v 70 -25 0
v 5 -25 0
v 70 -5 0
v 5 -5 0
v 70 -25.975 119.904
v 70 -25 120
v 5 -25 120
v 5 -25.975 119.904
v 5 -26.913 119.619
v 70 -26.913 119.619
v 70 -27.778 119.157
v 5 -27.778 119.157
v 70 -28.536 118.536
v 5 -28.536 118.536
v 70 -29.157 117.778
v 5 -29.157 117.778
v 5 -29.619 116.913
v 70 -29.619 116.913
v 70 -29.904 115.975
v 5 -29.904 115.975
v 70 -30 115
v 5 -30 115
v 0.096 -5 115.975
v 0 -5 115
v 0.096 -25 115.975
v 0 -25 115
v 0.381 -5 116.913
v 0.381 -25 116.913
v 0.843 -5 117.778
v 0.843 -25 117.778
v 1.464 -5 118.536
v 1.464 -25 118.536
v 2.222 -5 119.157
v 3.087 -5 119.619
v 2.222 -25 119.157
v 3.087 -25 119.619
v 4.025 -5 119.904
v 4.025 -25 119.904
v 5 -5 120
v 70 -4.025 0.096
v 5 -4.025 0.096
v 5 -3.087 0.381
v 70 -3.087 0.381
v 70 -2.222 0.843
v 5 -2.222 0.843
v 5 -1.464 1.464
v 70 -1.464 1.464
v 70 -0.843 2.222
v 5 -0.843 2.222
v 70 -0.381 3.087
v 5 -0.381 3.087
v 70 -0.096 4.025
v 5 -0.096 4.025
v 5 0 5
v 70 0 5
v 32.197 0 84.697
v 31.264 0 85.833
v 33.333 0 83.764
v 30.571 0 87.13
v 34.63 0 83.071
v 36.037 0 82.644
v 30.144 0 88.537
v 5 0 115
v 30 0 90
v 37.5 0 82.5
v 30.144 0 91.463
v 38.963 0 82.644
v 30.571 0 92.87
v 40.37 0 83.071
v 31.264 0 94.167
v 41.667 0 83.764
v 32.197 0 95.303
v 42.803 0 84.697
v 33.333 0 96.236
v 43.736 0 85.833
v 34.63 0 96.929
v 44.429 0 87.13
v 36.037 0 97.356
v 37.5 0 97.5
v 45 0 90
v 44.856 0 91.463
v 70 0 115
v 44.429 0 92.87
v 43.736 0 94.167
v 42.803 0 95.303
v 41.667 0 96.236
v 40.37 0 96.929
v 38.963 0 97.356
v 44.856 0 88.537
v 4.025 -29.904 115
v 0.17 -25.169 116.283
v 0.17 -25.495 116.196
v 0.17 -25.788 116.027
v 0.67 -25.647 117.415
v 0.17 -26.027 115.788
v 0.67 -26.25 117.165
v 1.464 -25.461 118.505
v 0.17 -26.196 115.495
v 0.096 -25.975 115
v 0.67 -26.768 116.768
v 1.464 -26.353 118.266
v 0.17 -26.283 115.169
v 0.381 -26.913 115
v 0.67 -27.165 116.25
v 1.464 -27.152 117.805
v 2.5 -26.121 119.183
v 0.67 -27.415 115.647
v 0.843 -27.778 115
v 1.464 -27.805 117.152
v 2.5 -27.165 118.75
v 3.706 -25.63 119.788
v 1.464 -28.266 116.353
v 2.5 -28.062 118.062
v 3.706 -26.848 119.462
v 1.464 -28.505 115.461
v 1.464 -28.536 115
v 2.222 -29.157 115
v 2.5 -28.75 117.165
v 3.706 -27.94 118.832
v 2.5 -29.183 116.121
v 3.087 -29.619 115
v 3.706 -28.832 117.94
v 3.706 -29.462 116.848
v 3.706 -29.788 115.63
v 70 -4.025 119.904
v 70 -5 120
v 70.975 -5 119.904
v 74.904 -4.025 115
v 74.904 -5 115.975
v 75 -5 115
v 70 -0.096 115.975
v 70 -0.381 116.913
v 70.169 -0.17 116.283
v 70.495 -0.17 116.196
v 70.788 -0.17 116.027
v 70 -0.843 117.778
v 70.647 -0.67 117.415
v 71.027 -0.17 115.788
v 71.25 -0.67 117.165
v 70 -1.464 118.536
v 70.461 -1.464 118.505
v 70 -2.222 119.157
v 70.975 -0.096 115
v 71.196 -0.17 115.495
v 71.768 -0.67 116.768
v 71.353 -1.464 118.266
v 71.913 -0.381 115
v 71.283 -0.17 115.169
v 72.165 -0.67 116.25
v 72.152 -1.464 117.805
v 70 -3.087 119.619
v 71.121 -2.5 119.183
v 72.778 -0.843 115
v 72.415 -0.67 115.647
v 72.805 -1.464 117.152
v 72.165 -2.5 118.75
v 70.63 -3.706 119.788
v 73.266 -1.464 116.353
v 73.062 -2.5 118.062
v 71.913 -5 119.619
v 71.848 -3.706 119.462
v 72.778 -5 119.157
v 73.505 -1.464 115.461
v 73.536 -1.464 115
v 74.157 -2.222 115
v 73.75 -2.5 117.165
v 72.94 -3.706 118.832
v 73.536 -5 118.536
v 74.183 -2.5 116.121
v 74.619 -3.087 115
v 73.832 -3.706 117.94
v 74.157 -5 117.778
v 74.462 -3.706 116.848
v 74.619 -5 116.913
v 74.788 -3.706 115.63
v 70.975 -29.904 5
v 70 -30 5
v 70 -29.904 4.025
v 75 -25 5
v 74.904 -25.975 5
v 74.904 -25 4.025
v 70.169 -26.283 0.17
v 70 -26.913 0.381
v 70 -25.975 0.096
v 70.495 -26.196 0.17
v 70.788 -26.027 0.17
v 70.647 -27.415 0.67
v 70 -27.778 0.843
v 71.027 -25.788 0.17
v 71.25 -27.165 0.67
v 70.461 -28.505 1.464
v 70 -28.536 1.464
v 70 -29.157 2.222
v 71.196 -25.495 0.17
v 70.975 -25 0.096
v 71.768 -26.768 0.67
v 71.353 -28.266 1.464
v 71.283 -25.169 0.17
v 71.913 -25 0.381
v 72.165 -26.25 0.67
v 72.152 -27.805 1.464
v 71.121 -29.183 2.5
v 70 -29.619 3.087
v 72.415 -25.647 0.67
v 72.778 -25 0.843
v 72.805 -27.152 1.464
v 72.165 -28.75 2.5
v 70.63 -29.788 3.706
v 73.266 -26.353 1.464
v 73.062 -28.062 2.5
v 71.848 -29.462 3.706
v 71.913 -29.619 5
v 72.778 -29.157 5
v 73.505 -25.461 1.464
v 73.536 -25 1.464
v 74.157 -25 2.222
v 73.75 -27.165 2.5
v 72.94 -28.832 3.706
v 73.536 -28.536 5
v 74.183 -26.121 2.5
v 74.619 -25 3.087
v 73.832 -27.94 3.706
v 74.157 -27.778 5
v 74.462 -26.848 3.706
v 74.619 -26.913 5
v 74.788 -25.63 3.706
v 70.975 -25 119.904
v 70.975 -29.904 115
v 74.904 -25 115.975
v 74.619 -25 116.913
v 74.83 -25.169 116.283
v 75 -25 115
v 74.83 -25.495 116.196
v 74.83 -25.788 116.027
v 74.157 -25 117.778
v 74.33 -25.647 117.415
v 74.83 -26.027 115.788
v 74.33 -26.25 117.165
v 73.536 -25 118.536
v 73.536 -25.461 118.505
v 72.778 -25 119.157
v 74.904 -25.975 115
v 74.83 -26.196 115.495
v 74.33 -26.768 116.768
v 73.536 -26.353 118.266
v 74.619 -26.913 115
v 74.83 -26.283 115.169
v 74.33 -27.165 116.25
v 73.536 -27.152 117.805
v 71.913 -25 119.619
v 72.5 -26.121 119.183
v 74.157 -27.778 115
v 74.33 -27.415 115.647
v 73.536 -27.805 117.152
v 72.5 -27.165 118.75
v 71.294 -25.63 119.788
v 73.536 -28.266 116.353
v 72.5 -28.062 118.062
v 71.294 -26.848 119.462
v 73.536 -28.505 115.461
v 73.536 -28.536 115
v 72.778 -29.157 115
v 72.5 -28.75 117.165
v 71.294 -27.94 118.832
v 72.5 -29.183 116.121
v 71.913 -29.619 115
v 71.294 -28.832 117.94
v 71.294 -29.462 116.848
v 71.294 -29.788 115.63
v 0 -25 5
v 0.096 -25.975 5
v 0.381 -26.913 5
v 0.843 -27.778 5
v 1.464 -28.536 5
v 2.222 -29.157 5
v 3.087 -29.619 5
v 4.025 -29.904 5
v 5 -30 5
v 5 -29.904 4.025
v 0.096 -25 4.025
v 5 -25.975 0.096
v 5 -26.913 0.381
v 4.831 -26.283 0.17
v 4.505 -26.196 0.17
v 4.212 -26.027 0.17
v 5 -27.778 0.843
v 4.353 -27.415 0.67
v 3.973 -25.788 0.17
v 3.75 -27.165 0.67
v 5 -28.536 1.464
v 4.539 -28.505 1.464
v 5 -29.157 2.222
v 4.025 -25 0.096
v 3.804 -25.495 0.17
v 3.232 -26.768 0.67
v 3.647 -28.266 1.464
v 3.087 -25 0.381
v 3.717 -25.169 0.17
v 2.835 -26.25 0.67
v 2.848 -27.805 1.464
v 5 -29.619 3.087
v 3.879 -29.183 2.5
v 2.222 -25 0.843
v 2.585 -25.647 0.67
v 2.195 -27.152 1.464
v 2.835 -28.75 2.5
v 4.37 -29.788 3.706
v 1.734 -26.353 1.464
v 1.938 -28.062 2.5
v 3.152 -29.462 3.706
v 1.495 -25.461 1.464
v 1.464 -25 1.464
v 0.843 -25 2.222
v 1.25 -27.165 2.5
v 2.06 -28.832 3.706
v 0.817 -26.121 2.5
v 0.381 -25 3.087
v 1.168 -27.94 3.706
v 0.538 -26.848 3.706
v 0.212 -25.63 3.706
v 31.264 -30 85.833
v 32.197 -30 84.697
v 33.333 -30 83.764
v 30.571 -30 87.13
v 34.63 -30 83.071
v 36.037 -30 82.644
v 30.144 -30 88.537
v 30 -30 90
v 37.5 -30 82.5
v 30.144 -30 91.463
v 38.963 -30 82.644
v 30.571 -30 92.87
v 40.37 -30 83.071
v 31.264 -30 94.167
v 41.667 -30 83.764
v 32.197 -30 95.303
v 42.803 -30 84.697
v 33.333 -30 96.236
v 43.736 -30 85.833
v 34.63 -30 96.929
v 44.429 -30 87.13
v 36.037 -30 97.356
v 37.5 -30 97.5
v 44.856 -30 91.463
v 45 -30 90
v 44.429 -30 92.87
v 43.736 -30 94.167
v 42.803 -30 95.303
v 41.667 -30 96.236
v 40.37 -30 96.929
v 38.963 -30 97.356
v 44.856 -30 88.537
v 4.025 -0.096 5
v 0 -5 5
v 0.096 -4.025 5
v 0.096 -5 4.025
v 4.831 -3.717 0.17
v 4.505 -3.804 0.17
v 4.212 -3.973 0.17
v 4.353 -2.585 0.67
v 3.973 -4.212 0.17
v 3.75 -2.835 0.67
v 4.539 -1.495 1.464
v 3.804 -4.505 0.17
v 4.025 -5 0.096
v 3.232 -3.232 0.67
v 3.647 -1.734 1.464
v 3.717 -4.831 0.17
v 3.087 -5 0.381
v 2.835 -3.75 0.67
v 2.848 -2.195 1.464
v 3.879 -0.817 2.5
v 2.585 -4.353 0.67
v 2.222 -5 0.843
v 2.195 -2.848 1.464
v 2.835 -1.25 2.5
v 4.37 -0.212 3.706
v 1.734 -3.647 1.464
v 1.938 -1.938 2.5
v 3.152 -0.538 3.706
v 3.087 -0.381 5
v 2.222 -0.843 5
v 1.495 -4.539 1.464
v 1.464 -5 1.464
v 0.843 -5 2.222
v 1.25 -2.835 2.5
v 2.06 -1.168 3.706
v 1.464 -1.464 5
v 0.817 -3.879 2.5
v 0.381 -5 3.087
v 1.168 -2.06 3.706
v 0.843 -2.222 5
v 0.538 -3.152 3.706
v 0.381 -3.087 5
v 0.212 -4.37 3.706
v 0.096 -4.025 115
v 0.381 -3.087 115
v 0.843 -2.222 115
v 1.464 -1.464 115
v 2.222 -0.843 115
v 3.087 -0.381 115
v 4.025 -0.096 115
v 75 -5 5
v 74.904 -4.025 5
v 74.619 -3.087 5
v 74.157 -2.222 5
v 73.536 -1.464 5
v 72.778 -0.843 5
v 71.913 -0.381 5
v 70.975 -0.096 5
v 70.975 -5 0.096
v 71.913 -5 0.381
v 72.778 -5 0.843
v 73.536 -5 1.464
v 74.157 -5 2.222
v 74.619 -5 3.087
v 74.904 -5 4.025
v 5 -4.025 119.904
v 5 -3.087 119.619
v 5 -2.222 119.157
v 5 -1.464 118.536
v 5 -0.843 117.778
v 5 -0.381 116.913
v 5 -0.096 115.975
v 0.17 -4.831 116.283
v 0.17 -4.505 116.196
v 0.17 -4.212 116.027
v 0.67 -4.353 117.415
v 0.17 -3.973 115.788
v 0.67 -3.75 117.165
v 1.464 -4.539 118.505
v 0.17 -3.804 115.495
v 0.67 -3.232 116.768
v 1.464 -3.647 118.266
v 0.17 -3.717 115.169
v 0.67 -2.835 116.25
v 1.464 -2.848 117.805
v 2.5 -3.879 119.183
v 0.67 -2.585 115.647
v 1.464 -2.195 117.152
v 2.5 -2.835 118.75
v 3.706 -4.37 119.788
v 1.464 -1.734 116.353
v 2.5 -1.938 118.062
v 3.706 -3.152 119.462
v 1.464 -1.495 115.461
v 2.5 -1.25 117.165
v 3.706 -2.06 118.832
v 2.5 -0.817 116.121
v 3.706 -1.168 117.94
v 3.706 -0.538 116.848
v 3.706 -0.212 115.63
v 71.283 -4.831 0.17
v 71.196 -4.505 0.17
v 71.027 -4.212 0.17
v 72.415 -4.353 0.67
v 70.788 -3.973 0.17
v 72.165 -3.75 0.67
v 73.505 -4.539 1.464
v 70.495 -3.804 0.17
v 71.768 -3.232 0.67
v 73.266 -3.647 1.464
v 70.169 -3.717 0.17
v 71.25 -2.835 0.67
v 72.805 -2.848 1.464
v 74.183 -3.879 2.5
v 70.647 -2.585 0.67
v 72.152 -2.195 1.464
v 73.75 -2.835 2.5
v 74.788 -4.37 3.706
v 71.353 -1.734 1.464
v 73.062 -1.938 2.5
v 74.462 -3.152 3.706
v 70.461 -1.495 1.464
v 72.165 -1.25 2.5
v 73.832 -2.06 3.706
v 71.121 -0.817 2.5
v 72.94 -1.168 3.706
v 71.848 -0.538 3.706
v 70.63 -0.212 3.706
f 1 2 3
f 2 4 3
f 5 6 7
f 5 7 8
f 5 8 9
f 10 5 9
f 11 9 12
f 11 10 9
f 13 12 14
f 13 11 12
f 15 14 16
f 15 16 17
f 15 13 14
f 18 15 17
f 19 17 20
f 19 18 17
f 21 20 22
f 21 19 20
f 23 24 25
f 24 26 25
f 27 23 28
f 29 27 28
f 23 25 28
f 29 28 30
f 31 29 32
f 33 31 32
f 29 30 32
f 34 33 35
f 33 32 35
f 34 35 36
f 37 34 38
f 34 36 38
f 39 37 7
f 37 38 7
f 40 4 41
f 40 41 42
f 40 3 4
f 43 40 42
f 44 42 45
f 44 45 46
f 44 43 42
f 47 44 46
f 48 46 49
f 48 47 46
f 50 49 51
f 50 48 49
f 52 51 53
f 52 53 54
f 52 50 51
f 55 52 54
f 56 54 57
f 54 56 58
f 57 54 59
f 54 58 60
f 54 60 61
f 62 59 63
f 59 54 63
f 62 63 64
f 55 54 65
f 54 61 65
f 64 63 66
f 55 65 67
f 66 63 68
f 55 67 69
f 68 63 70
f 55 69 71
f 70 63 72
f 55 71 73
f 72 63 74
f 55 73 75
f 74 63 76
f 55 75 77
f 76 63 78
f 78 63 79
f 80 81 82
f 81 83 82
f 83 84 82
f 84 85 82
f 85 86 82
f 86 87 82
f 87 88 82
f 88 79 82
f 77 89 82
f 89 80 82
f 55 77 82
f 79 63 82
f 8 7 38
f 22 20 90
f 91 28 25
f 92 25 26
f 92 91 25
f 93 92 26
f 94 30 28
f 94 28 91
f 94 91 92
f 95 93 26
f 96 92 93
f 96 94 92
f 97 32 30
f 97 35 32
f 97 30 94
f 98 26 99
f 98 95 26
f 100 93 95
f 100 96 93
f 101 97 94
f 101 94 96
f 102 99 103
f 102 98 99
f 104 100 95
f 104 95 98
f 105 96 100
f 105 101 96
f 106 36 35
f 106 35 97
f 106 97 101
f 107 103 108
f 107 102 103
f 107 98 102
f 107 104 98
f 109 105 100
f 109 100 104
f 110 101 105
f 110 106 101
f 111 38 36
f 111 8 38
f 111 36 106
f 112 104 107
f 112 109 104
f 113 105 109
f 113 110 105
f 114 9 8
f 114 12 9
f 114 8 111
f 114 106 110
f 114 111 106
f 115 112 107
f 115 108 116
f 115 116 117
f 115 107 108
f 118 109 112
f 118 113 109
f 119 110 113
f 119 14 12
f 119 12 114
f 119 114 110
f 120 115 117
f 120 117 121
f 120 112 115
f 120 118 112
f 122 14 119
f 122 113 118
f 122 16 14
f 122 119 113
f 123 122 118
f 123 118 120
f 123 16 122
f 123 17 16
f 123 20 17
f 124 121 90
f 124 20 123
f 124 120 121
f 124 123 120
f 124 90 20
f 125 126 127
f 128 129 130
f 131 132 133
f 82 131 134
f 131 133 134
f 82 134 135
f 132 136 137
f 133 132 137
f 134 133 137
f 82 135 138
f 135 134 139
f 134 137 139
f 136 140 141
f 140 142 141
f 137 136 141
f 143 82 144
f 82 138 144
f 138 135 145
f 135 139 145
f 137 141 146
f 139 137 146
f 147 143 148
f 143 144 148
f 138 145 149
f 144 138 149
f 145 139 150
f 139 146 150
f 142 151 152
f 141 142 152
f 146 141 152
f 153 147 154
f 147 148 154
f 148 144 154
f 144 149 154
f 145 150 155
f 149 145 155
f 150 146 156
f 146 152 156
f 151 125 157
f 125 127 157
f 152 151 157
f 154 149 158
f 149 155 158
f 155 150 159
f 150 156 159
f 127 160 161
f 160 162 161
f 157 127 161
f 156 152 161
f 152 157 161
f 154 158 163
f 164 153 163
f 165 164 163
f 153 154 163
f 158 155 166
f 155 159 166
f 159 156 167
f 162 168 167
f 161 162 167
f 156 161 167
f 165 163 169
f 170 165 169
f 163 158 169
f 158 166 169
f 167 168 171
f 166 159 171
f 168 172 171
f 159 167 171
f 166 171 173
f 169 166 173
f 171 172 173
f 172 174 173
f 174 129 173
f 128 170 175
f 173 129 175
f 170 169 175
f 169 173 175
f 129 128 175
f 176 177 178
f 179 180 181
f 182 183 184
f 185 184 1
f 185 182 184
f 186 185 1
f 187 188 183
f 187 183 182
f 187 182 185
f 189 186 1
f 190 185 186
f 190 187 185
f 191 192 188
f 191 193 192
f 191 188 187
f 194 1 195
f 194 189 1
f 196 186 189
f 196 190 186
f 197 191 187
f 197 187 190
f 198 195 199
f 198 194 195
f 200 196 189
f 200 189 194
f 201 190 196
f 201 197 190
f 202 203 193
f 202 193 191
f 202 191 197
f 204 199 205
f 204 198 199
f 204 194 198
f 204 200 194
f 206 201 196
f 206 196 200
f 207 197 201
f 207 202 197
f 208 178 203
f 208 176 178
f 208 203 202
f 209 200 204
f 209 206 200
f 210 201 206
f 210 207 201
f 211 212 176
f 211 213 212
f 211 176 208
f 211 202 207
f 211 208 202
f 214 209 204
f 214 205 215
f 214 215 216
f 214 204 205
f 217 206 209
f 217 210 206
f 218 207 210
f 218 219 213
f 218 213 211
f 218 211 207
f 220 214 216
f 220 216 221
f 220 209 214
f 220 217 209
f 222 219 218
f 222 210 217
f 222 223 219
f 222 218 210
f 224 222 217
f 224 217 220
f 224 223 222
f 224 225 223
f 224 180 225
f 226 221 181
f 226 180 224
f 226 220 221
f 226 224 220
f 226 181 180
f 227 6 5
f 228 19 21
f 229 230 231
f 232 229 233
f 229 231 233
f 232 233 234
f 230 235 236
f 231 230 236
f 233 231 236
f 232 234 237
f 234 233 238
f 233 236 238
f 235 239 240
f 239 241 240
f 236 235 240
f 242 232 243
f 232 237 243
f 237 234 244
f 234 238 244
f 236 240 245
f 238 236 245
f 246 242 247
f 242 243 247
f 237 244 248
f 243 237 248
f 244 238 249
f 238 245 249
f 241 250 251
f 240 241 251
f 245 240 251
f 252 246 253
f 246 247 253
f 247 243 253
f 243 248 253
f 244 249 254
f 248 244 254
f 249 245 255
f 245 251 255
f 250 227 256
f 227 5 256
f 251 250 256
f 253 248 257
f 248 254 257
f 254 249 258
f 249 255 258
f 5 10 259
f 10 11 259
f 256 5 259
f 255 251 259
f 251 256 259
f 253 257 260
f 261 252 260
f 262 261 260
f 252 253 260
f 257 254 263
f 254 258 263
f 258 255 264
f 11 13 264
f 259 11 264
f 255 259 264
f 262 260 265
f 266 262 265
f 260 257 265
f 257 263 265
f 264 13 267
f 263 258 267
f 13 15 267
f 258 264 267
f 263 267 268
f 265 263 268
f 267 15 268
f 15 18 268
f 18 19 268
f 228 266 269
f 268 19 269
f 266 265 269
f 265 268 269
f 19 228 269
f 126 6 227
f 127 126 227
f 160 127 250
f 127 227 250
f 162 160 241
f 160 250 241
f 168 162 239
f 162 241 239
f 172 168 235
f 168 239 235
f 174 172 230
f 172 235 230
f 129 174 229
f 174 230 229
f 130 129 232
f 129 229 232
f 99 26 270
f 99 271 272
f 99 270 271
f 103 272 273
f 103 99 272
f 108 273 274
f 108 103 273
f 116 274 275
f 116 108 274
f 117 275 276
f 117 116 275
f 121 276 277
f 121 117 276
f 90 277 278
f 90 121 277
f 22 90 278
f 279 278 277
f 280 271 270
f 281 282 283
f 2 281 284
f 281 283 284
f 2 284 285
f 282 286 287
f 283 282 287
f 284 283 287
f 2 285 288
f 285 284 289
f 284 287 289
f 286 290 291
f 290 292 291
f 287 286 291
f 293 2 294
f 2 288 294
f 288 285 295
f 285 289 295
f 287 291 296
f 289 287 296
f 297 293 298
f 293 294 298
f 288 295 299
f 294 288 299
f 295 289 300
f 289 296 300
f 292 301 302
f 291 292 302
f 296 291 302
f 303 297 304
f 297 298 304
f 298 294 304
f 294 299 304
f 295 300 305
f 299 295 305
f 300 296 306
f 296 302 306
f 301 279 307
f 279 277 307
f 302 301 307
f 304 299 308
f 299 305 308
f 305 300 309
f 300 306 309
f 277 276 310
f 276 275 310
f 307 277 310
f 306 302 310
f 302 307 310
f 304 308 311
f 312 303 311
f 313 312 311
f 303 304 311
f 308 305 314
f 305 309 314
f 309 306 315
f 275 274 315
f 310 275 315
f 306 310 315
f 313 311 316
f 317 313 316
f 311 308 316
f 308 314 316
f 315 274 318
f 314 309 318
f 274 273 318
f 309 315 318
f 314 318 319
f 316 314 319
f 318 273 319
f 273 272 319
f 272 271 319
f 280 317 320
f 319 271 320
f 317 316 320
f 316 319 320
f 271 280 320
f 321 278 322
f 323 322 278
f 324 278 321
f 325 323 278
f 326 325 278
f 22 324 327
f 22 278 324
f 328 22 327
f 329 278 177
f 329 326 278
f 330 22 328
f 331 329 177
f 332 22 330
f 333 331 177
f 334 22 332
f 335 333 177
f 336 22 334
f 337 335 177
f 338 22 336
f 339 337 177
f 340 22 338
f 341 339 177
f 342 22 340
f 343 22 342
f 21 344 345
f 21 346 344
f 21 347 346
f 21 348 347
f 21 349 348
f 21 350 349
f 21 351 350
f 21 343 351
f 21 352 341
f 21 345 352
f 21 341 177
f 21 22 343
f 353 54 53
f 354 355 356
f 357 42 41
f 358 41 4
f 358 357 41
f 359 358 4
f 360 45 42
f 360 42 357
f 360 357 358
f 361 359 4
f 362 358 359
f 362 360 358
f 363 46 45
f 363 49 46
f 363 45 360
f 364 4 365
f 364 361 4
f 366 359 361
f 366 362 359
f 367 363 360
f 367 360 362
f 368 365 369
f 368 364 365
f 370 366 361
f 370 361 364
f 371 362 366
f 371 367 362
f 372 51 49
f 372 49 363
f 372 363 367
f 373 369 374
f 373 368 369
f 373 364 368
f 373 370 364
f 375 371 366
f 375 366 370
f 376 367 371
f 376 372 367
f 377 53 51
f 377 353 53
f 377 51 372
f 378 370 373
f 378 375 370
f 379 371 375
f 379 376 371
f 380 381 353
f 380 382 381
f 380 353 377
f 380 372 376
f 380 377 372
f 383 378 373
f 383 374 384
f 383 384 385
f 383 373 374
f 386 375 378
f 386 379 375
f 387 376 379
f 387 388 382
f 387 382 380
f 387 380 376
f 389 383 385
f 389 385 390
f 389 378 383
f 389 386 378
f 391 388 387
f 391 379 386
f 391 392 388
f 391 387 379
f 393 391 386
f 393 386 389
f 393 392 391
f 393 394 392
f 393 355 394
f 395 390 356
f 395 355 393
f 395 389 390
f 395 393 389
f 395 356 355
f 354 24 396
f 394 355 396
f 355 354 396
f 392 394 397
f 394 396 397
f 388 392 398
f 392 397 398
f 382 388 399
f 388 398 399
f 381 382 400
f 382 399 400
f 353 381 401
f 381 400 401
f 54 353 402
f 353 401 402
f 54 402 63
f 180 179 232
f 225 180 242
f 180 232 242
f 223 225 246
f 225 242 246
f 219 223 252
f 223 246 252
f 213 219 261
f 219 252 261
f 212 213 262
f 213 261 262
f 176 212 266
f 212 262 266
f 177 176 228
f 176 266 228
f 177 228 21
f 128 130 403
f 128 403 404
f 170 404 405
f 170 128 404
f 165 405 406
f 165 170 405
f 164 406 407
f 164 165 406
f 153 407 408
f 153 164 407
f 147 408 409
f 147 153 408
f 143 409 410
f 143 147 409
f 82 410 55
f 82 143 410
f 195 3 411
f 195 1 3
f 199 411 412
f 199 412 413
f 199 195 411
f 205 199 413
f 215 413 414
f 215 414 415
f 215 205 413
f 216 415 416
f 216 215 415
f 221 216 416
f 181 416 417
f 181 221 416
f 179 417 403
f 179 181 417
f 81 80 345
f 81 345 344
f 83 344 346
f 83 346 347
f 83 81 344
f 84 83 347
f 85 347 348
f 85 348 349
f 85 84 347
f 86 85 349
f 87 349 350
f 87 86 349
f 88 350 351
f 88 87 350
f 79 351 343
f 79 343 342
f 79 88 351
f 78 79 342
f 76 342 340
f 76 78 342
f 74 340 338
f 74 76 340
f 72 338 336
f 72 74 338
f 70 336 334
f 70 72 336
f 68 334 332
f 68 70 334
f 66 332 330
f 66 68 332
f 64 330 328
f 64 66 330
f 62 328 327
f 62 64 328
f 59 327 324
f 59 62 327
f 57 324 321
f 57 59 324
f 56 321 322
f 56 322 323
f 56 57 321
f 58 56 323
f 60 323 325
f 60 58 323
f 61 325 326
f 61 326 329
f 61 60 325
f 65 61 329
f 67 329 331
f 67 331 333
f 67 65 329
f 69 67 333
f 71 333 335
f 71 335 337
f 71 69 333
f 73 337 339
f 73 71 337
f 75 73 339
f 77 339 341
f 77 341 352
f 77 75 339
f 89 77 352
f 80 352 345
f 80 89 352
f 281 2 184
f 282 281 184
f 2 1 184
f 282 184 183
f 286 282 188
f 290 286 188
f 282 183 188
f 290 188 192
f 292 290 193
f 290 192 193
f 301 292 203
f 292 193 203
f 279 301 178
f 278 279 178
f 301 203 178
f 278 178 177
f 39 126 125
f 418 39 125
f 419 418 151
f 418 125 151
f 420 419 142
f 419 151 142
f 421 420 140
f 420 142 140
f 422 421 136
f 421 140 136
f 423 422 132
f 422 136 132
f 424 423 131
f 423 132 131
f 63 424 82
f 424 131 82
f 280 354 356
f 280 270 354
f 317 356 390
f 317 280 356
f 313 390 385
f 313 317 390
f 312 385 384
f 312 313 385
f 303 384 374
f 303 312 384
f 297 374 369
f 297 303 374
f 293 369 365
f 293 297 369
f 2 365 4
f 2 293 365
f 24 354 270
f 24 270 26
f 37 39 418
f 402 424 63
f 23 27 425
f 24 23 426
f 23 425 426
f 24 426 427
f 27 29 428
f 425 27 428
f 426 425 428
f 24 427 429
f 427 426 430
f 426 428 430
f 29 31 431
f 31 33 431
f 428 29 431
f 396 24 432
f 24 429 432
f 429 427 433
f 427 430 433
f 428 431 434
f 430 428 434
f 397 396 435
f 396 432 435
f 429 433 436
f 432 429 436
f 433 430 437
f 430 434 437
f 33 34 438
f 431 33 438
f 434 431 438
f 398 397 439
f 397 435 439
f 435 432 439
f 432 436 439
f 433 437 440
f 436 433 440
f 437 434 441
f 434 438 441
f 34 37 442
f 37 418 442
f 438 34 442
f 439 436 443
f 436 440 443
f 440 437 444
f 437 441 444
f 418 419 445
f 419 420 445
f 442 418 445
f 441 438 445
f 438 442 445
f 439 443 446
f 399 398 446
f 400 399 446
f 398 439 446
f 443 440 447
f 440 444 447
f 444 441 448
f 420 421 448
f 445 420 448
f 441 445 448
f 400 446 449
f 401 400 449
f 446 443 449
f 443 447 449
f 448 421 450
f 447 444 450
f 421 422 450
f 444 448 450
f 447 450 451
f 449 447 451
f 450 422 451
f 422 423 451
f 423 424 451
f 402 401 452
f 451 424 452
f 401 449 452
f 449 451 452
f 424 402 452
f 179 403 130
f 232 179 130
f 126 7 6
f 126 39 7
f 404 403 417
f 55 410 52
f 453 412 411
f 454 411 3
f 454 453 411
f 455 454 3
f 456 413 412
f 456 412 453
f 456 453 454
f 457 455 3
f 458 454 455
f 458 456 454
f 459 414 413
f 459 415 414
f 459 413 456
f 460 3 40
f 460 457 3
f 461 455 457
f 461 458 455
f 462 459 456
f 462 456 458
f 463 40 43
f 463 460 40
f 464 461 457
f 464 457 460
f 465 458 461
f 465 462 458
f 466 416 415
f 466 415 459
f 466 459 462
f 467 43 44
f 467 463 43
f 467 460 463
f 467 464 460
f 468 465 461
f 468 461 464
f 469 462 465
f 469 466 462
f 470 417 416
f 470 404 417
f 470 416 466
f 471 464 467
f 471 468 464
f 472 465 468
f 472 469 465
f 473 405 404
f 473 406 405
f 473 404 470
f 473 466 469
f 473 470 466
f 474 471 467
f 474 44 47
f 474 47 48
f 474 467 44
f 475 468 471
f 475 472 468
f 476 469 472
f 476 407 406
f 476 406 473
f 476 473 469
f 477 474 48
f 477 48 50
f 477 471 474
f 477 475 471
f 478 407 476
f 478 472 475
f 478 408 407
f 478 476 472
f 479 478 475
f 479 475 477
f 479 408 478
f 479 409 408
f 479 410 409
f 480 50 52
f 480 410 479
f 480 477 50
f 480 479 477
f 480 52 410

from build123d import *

# Parameters (mm, degrees)
F0_W     = 75
F0_H     = 120
F0_R     = 7.5
F1_DEPTH = 30
F2_R     = 5


with BuildPart() as f1:
    # F0 (on Front) → F1 (new body)
    with BuildSketch(Plane.XZ):
        with Locations((37.5, 60)):
            Rectangle(F0_W, F0_H)
        with Locations((37.5, 90)):
            Circle(F0_R, mode=Mode.SUBTRACT)
    extrude(amount=F1_DEPTH)

    # F2
    f2_edges = [f1.edges().sort_by_distance(p)[0] for p in [
        (37.5, -30, 120),
        (75, -15, 120),
        (37.5, 0, 120),
        (0, -15, 120),
        (0, 0, 60),
        (0, -30, 60),
        (75, 0, 60),
        (75, -30, 60),
        (37.5, -30, 0),
        (75, -15, 0),
        (37.5, 0, 0),
        (0, -15, 0),
    ]]
    fillet(f2_edges, radius=F2_R)


solid = f1.part
